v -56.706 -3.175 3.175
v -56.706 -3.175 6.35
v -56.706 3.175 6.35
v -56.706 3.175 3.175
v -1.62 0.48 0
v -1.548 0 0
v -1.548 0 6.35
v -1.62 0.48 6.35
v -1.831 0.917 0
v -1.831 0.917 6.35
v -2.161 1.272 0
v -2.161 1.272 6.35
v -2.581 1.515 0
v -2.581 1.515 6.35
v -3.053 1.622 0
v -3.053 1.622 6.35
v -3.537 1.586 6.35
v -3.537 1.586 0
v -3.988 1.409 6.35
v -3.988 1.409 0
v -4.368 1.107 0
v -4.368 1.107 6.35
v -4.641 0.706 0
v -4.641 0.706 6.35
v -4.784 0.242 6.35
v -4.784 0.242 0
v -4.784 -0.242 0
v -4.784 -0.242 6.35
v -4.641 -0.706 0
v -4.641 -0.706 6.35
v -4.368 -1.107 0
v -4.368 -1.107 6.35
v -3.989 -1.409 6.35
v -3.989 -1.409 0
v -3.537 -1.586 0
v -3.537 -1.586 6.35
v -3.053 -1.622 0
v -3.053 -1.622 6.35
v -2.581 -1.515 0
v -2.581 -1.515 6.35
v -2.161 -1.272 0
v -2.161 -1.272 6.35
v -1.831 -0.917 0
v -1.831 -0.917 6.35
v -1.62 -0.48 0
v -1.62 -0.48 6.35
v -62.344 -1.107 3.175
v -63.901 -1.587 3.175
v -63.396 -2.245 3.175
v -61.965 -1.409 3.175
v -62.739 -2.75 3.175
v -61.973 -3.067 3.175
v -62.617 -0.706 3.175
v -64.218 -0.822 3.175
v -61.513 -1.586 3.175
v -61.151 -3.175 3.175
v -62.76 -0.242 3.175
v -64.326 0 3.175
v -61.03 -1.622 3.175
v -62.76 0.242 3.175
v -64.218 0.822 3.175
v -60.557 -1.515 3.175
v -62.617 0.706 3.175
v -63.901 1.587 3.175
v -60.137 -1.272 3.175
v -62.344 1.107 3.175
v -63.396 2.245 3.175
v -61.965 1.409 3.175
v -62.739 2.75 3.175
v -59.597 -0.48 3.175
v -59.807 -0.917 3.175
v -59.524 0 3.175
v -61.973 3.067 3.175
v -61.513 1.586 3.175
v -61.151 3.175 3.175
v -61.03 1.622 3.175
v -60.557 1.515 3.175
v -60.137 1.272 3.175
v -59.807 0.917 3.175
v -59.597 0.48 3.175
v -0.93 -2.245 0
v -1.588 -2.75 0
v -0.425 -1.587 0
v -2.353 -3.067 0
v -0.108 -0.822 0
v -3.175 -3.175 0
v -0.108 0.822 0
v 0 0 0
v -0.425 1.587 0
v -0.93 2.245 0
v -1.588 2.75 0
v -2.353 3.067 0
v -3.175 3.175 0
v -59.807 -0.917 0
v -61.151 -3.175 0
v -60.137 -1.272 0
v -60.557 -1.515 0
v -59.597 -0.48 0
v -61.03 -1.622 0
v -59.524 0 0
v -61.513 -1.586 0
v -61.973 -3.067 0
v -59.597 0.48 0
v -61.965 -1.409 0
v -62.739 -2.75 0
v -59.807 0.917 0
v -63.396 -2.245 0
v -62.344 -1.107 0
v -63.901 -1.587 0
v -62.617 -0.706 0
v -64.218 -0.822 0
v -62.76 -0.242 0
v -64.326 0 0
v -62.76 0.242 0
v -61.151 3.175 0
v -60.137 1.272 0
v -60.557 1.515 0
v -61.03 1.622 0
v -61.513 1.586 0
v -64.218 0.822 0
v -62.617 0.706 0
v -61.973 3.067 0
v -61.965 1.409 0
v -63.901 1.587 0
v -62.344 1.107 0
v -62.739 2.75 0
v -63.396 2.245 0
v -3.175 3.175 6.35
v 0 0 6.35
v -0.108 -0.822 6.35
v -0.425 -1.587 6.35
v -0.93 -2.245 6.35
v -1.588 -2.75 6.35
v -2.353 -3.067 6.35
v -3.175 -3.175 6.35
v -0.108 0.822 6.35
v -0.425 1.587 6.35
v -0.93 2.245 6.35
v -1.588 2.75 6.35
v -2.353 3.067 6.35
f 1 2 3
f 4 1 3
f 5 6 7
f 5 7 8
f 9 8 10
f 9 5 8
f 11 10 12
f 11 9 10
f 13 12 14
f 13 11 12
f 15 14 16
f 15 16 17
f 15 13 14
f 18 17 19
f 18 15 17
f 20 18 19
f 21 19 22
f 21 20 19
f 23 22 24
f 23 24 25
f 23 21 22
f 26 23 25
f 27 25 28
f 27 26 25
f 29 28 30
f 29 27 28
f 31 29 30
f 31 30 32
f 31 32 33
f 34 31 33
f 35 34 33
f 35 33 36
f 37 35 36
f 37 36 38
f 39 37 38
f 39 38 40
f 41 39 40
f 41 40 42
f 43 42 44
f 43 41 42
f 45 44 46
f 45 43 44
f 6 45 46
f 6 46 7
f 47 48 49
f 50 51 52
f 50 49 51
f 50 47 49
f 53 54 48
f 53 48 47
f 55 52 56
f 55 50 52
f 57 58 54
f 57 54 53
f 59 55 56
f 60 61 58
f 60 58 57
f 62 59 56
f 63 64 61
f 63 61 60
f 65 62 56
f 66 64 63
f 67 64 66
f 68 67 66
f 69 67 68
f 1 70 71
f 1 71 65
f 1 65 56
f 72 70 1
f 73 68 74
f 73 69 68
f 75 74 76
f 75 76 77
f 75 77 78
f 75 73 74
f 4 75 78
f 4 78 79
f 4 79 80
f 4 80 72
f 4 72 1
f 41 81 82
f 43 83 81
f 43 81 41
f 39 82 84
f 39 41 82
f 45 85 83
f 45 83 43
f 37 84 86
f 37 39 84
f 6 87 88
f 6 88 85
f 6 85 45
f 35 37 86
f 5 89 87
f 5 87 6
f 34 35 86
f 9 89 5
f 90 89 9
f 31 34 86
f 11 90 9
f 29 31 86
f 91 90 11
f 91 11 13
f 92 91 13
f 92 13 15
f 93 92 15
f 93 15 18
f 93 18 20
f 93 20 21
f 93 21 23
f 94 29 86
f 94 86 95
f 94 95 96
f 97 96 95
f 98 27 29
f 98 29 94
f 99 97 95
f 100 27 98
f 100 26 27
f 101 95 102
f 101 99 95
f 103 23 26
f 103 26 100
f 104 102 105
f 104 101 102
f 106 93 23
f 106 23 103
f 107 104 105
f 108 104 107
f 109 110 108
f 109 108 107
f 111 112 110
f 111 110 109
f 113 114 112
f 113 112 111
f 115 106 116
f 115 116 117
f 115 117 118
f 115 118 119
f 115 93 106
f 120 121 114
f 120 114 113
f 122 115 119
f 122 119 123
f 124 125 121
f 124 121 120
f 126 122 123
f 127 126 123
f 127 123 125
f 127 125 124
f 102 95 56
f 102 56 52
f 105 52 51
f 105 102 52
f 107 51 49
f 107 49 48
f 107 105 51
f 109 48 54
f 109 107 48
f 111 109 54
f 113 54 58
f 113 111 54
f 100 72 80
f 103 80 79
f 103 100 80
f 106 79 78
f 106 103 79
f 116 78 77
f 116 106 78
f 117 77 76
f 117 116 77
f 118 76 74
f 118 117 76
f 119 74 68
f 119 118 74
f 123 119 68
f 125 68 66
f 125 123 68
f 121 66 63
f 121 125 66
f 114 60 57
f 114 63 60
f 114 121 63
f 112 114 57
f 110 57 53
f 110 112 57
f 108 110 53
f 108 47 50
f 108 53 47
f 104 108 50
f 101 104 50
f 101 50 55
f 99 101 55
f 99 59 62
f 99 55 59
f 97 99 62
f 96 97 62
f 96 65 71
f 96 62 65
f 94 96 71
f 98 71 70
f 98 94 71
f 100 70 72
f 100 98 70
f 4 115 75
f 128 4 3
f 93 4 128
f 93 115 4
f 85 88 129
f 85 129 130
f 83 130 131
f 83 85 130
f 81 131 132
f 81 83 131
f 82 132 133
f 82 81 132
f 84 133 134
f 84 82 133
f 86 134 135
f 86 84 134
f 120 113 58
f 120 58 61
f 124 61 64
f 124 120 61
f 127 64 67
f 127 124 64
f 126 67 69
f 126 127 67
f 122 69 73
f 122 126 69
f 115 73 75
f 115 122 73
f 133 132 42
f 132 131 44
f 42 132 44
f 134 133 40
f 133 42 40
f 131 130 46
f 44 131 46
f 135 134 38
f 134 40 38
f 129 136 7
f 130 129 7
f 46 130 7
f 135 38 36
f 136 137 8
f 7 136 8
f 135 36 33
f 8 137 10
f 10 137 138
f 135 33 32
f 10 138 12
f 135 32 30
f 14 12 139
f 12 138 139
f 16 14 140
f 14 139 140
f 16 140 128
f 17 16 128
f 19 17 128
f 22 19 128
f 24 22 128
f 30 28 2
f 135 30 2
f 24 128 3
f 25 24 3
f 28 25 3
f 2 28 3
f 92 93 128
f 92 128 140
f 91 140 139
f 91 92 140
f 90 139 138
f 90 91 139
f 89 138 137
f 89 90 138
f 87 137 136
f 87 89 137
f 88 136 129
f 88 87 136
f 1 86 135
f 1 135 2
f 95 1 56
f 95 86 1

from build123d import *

# Parameters (mm, degrees)
SKETCH1_R           = 1.627
BOSS_EXTRUDE1_DEPTH = 6.35
SKETCH2_W           = 8.278201301
SKETCH2_H           = 8.19304218
CUT_EXTRUDE1_DEPTH  = 3.175


with BuildPart() as part:
    # Sketch1 → Boss-Extrude1 (new body)
    with BuildSketch(Plane.XY):
        with BuildLine():
            Line((-35.456602045, 3.175), (-7.62, 3.175))
            Line((-7.62, 3.175), (-3.175, 3.175))
            ThreePointArc((-3.175, 3.175), (-0.92993597, 2.24506403), (0, 0))
            ThreePointArc((0, 0), (-0.92993597, -2.24506403), (-3.175, -3.175))
            Line((-3.175, -3.175), (-7.62, -3.175))
            Line((-7.62, -3.175), (-35.456602045, -3.175))
            Line((-35.456602045, -3.175), (-61.15130657, -3.175))
            ThreePointArc((-61.15130657, -3.175), (-63.3963706, -2.24506403), (-64.32630657, 0))
            ThreePointArc((-64.32630657, 0), (-63.3963706, 2.24506403), (-61.15130657, 3.175))
            Line((-61.15130657, 3.175), (-35.456602045, 3.175))
        make_face()
        with Locations((-3.175, 0)):
            Circle(SKETCH1_R, mode=Mode.SUBTRACT)
        with Locations((-61.15130657, 0)):
            Circle(SKETCH1_R, mode=Mode.SUBTRACT)
    extrude(amount=BOSS_EXTRUDE1_DEPTH)

    # Sketch2 → Cut-Extrude1 (cut)
    with BuildSketch(Plane.XY.offset(6.35)):
        with Locations((-60.845407221, -0.92152109)):
            Rectangle(SKETCH2_W, SKETCH2_H)
    extrude(amount=-CUT_EXTRUDE1_DEPTH, mode=Mode.SUBTRACT)


solid = part.part
